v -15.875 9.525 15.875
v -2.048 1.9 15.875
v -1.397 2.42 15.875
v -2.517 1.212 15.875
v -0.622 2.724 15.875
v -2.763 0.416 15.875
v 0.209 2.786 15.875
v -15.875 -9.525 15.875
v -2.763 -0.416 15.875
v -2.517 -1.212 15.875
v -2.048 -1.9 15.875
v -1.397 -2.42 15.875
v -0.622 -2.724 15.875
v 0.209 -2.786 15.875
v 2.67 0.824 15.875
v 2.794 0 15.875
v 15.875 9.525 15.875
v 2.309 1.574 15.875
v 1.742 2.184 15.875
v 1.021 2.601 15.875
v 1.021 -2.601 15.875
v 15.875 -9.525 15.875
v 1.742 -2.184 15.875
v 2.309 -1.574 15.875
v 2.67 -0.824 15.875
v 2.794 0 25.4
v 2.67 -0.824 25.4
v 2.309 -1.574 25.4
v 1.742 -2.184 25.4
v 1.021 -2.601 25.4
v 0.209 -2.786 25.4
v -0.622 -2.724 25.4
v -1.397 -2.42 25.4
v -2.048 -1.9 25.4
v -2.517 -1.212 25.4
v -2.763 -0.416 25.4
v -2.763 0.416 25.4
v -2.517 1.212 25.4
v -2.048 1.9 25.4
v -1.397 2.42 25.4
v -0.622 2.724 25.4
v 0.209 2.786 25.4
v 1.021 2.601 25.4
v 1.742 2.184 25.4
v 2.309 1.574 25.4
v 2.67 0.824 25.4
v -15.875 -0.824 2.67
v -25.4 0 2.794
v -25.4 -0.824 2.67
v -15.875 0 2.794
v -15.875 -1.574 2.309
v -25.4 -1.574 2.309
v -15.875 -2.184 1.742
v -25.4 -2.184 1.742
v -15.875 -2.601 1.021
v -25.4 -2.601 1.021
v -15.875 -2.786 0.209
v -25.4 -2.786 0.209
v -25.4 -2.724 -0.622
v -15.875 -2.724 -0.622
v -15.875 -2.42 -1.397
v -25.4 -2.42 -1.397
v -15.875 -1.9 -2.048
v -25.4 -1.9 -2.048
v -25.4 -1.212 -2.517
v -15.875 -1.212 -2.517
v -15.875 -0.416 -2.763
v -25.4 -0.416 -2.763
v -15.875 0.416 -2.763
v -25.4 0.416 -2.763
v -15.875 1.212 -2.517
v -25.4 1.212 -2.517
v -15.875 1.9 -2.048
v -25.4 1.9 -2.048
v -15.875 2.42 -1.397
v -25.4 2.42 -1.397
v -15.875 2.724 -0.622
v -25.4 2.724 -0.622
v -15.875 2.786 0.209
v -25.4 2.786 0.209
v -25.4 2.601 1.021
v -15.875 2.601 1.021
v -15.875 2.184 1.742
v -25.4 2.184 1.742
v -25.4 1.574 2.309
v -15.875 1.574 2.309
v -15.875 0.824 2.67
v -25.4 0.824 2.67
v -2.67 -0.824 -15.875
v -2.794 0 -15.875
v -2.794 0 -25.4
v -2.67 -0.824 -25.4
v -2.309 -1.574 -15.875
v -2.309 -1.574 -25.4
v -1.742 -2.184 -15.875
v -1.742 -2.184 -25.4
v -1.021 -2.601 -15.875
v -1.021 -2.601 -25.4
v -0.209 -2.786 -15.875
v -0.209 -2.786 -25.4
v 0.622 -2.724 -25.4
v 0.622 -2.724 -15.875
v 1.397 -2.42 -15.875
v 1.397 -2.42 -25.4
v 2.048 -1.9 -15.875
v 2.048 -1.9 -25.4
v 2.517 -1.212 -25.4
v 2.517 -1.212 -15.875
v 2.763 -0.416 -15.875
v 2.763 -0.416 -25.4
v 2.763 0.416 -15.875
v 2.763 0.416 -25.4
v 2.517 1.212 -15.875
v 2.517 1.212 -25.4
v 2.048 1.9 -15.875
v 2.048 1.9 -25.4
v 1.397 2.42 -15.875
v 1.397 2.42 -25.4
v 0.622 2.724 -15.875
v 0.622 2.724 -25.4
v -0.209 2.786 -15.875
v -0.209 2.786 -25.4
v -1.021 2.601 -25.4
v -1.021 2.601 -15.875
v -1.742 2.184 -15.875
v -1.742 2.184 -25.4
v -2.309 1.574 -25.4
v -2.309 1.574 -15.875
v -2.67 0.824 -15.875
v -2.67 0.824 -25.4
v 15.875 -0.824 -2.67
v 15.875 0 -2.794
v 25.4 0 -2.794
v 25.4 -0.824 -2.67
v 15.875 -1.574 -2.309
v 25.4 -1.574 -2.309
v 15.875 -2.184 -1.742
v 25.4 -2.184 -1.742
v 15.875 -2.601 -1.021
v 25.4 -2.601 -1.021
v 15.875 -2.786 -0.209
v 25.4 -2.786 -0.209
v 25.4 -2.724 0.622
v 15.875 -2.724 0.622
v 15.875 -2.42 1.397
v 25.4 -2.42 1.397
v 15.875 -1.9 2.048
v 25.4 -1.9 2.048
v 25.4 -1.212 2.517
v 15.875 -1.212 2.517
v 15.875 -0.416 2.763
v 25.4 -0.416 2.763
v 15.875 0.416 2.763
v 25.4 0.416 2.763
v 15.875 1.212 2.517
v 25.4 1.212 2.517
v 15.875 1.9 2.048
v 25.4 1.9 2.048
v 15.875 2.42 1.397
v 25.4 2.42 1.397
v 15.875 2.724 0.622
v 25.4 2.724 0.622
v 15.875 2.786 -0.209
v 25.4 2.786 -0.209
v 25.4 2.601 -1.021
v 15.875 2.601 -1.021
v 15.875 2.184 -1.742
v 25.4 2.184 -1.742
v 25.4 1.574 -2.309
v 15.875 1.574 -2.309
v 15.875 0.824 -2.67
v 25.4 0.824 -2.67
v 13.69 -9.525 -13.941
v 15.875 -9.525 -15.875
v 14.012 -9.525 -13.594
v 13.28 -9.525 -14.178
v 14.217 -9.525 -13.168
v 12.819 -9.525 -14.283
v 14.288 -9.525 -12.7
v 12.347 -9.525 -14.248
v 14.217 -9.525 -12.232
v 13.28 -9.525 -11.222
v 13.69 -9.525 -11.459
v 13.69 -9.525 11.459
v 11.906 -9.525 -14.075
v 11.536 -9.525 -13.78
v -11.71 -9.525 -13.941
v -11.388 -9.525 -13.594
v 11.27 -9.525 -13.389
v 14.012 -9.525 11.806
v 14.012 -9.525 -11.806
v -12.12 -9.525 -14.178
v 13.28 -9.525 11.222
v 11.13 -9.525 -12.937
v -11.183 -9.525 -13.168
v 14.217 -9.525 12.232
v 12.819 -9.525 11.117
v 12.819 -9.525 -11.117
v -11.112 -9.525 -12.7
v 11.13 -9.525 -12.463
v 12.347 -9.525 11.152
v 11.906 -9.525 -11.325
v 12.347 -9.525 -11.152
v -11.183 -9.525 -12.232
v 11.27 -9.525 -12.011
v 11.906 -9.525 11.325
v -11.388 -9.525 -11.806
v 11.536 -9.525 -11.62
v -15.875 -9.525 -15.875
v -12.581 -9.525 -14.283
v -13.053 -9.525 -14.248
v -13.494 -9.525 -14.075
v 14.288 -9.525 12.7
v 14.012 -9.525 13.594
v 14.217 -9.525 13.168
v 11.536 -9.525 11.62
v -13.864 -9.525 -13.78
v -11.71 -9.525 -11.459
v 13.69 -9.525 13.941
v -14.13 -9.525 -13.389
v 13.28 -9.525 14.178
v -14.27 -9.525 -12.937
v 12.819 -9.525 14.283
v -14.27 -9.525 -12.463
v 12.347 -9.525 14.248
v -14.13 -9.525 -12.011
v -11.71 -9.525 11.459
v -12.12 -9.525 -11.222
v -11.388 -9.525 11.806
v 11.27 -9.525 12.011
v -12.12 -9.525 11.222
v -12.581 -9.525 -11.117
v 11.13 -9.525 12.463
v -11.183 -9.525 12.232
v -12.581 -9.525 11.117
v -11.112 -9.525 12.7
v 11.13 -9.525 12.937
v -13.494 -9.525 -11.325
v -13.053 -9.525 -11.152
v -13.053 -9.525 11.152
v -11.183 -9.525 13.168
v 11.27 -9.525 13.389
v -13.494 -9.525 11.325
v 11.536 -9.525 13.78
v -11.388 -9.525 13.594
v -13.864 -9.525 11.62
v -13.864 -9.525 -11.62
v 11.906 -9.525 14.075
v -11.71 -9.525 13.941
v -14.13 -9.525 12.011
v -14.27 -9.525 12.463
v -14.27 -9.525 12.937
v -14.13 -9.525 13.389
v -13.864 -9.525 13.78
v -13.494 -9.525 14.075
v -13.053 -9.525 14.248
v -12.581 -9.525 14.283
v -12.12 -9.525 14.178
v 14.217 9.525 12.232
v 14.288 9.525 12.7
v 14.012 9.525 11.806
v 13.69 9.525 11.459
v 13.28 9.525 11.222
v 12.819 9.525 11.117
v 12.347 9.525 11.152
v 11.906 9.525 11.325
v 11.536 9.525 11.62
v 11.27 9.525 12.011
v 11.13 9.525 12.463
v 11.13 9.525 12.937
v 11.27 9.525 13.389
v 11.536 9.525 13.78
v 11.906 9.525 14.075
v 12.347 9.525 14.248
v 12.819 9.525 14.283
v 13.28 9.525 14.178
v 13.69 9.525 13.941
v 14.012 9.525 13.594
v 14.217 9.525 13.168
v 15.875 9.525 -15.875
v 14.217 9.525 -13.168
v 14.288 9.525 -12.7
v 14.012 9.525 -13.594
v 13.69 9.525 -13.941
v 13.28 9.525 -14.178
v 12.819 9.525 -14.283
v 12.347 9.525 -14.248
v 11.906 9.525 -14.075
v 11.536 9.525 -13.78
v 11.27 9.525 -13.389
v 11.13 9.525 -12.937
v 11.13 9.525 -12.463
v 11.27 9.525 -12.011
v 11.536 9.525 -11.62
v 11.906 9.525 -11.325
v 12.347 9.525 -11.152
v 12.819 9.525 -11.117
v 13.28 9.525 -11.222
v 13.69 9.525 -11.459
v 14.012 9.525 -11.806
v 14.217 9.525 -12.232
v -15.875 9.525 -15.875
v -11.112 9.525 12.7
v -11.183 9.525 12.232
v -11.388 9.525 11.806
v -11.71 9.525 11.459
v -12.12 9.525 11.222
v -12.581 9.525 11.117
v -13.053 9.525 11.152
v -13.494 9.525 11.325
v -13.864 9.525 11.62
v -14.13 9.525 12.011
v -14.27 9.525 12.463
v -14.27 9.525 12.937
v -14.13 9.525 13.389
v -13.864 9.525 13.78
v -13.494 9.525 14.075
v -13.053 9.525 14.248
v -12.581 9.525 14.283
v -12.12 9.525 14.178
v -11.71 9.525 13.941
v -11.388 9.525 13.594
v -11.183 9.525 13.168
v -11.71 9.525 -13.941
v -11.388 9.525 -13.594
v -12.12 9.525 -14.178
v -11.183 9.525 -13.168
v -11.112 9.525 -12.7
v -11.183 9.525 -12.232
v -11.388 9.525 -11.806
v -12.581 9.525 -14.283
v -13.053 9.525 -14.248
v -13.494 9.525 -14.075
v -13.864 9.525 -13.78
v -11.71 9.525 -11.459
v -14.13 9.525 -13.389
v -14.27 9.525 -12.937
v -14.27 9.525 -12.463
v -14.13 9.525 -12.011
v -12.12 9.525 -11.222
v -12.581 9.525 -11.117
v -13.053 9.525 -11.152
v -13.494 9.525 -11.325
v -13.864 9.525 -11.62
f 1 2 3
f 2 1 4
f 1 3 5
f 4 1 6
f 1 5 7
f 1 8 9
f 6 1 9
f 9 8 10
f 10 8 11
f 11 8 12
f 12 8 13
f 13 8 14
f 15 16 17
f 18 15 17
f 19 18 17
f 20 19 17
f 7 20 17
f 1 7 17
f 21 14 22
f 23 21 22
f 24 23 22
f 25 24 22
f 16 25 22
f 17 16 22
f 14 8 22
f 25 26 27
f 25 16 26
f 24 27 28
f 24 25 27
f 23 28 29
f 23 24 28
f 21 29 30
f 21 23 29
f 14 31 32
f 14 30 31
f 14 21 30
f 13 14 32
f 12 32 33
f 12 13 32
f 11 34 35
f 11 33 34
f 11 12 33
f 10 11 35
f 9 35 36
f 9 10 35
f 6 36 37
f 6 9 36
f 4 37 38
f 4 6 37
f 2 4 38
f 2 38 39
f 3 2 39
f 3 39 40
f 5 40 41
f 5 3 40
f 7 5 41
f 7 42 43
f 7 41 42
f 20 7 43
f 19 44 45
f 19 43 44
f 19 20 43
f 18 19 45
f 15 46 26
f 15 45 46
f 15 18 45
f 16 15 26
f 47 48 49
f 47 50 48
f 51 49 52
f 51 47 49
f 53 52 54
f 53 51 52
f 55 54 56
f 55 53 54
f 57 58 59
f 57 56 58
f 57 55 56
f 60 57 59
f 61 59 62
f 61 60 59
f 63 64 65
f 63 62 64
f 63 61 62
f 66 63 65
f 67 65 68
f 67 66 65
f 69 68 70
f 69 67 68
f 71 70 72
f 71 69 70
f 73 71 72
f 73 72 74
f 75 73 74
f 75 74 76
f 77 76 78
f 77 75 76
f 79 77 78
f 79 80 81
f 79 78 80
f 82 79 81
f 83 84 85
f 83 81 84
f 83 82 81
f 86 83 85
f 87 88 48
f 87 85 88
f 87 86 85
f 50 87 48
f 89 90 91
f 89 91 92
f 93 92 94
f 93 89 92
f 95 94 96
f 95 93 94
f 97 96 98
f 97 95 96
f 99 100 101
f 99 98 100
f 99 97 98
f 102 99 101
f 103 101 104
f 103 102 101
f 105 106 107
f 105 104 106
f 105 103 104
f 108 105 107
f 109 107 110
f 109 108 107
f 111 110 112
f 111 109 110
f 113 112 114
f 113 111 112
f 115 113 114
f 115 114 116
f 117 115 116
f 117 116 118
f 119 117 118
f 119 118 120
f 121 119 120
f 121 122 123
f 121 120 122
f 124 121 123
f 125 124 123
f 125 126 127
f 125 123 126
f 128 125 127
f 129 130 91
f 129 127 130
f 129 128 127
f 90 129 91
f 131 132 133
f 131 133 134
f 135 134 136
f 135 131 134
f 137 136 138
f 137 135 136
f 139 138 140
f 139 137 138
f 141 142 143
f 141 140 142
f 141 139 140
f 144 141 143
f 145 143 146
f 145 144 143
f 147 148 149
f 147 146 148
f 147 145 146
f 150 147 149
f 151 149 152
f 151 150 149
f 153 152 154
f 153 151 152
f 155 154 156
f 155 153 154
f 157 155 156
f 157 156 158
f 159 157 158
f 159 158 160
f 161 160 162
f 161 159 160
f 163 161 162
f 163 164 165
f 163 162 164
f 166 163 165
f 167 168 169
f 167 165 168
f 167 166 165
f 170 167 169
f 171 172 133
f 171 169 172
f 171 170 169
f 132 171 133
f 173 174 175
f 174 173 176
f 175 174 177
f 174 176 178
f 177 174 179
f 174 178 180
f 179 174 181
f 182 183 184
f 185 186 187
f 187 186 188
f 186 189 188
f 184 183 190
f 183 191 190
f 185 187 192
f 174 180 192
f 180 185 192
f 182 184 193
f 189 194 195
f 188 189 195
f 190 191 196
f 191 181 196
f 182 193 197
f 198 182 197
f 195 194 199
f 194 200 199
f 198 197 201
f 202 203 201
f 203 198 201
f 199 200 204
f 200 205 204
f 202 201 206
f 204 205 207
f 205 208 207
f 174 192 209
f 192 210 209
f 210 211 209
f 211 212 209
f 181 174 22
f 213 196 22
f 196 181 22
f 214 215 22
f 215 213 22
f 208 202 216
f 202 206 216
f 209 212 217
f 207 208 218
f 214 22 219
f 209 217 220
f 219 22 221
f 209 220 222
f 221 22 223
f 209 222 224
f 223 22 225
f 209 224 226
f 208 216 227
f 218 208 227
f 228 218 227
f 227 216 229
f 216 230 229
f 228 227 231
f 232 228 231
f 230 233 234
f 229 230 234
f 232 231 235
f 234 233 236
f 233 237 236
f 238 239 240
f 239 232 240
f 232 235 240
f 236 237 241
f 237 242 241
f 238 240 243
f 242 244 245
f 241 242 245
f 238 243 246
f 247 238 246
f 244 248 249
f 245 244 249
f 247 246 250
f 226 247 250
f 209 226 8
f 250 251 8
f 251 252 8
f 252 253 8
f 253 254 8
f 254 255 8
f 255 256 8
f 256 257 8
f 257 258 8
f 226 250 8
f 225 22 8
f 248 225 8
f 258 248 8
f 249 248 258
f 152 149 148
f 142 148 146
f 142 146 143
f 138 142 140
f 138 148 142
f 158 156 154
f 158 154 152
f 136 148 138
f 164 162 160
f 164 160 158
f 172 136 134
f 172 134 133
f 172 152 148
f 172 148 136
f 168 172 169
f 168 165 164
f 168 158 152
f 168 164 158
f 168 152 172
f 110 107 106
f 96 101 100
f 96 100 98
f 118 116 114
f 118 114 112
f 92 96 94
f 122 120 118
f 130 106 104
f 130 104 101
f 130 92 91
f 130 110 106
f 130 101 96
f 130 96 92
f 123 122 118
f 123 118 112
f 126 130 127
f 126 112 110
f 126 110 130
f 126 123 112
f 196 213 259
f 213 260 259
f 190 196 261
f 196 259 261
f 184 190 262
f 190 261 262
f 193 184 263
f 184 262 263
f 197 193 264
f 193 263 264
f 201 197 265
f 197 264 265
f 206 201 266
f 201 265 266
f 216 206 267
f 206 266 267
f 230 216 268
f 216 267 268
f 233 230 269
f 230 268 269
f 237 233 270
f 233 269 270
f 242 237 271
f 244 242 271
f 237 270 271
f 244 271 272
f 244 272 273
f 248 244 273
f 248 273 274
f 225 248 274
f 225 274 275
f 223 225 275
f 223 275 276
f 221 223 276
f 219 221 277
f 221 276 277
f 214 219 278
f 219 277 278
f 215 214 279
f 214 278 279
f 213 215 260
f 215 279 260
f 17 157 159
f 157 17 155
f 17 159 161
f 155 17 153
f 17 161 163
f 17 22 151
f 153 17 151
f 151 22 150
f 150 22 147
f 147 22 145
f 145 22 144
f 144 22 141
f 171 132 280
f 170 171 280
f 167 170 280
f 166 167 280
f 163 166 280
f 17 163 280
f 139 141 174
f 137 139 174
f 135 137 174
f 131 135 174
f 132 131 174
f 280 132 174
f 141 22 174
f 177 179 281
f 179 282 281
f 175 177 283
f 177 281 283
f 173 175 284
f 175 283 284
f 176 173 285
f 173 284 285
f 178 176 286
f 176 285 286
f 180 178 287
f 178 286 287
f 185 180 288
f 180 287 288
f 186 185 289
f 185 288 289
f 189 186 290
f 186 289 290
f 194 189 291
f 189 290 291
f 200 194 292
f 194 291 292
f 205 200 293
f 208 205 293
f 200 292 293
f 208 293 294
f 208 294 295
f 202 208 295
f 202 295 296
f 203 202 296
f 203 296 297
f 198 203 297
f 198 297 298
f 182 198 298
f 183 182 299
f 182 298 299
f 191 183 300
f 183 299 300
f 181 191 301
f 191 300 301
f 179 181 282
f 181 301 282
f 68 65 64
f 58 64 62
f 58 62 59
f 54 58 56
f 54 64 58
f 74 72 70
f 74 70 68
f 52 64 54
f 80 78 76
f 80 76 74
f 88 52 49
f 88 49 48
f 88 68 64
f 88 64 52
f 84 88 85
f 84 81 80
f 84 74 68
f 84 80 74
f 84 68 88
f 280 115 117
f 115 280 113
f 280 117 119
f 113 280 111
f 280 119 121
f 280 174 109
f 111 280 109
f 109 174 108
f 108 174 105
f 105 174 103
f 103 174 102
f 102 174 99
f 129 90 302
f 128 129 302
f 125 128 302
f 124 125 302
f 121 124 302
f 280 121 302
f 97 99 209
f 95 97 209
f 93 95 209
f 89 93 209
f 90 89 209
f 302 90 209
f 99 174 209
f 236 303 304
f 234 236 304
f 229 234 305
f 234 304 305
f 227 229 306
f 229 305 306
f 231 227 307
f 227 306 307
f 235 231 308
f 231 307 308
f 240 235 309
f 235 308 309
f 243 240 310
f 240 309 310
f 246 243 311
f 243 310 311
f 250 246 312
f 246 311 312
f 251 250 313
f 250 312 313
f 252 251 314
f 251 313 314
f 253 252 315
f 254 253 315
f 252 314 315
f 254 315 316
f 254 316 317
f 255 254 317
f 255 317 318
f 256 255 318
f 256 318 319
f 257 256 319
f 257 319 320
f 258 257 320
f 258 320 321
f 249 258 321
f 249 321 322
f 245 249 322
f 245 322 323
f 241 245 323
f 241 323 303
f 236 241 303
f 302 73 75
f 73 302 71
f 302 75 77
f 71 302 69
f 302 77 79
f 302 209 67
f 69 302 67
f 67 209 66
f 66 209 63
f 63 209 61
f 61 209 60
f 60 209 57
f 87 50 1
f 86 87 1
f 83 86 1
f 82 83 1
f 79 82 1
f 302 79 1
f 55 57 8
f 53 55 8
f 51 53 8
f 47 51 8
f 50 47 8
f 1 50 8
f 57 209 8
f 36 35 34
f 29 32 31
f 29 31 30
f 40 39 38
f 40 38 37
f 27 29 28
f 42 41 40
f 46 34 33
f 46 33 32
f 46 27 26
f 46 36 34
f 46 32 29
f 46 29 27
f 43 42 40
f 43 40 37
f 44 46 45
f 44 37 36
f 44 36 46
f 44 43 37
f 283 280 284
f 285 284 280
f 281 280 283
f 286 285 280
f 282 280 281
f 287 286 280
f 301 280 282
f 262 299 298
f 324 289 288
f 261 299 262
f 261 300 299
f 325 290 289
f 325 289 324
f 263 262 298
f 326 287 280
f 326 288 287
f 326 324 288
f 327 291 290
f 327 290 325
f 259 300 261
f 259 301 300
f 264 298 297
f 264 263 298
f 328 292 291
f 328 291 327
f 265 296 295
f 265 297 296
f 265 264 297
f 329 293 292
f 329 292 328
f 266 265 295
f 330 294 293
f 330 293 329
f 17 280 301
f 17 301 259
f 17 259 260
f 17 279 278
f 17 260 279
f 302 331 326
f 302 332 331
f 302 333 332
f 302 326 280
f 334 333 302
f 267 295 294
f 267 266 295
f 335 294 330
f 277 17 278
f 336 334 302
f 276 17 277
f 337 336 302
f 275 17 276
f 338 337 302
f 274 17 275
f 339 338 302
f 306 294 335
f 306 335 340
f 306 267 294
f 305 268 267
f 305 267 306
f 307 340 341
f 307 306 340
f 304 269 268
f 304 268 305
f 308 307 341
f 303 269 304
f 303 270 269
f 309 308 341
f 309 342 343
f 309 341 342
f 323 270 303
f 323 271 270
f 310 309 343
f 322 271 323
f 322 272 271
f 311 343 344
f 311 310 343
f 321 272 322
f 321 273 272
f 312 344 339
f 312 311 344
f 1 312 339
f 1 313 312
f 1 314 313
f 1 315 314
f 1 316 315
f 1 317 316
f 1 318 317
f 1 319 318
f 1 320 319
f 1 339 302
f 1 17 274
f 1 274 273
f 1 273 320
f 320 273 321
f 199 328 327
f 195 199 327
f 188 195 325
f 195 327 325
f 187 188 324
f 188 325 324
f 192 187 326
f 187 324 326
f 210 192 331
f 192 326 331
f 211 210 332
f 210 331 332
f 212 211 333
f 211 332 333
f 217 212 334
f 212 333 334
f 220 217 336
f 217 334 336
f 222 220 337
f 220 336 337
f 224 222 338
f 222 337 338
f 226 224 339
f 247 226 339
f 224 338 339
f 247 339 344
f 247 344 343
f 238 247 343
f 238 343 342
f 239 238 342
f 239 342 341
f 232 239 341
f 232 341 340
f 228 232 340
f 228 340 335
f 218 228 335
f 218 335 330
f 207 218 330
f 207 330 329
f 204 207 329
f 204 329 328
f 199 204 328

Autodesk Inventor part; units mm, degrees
ref_plane "YZ Plane" through (0, 0, 0) normal (1, 0, 0) x (0, 1, 0)
ref_plane "XZ Plane" through (0, 0, 0) normal (0, 1, 0) x (-1, 0, 0)
ref_plane "XY Plane" through (0, 0, 0) normal (0, 0, 1) x (1, 0, 0)
sketch "Sketch1" plane through (0, 0, 0) normal (0, 1, 0) x (-1, 0, 0)
  line L0 (-15.875, -15.875) -> (15.875, -15.875)
  line L1 (15.875, -15.875) -> (15.875, 15.875)
  line L2 (15.875, 15.875) -> (-15.875, 15.875)
  line L3 (-15.875, 15.875) -> (-15.875, -15.875)
  line L4 (-15.875, -15.875) -> (15.875, 15.875) construction
  line L5 (15.875, -15.875) -> (-15.875, 15.875) construction
  point P0 (0, 0)
  dimension "d0" = 31.75
  dimension "d1" = 31.75
extrude "Extrusion1" add sketch "Sketch1" along normal mid plane 19.05
sketch "Sketch2" plane through (0, 9.525, 0) normal (0, 1, 0) x (1, 0, 0)
  circle A0 centre (-12.7, -12.7) radius 1.5875
  circle A1 centre (-12.7, 12.7) radius 1.5875
  circle A2 centre (12.7, -12.7) radius 1.5875
  circle A3 centre (12.7, 12.7) radius 1.5875
  point P0 (0, 0)
  dimension "d4" = 3.175
  dimension "d5" = 3.175
  dimension "d6" = 3.175
  dimension "d7" = 3.175
extrude "Extrusion2" cut sketch "Sketch2" against normal through all
sketch "Sketch3" plane through (-15.875, 9.525, 15.875) normal (0, 0, 1) x (1, 0, 0)
  circle A0 centre (15.875, -9.525) radius 2.794
  dimension "d10" = 5.588
sketch "Sketch4" plane through (15.875, -9.525, -15.875) normal (1, 0, 0) x (0, 0, -1)
  circle A0 centre (-15.875, 9.525) radius 2.794
  dimension "d11" = 5.588
sketch "Sketch5" plane through (15.875, 9.525, -15.875) normal (0, 0, -1) x (-1, 0, 0)
  circle A0 centre (15.875, -9.525) radius 2.794
  dimension "d12" = 5.588
sketch "Sketch6" plane through (-15.875, -9.525, 15.875) normal (-1, 0, 0) x (0, 0, 1)
  circle A0 centre (-15.875, 9.525) radius 2.794
  dimension "d13" = 5.588
extrude "Extrusion3" add sketch "Sketch6" along normal blind 9.525
extrude "Extrusion4" add sketch "Sketch5" along normal blind 9.525
extrude "Extrusion5" add sketch "Sketch4" along normal blind 9.525
extrude "Extrusion6" add sketch "Sketch3" along normal blind 9.525
properties part number "ZFSWHA-1-20+_Switch"
